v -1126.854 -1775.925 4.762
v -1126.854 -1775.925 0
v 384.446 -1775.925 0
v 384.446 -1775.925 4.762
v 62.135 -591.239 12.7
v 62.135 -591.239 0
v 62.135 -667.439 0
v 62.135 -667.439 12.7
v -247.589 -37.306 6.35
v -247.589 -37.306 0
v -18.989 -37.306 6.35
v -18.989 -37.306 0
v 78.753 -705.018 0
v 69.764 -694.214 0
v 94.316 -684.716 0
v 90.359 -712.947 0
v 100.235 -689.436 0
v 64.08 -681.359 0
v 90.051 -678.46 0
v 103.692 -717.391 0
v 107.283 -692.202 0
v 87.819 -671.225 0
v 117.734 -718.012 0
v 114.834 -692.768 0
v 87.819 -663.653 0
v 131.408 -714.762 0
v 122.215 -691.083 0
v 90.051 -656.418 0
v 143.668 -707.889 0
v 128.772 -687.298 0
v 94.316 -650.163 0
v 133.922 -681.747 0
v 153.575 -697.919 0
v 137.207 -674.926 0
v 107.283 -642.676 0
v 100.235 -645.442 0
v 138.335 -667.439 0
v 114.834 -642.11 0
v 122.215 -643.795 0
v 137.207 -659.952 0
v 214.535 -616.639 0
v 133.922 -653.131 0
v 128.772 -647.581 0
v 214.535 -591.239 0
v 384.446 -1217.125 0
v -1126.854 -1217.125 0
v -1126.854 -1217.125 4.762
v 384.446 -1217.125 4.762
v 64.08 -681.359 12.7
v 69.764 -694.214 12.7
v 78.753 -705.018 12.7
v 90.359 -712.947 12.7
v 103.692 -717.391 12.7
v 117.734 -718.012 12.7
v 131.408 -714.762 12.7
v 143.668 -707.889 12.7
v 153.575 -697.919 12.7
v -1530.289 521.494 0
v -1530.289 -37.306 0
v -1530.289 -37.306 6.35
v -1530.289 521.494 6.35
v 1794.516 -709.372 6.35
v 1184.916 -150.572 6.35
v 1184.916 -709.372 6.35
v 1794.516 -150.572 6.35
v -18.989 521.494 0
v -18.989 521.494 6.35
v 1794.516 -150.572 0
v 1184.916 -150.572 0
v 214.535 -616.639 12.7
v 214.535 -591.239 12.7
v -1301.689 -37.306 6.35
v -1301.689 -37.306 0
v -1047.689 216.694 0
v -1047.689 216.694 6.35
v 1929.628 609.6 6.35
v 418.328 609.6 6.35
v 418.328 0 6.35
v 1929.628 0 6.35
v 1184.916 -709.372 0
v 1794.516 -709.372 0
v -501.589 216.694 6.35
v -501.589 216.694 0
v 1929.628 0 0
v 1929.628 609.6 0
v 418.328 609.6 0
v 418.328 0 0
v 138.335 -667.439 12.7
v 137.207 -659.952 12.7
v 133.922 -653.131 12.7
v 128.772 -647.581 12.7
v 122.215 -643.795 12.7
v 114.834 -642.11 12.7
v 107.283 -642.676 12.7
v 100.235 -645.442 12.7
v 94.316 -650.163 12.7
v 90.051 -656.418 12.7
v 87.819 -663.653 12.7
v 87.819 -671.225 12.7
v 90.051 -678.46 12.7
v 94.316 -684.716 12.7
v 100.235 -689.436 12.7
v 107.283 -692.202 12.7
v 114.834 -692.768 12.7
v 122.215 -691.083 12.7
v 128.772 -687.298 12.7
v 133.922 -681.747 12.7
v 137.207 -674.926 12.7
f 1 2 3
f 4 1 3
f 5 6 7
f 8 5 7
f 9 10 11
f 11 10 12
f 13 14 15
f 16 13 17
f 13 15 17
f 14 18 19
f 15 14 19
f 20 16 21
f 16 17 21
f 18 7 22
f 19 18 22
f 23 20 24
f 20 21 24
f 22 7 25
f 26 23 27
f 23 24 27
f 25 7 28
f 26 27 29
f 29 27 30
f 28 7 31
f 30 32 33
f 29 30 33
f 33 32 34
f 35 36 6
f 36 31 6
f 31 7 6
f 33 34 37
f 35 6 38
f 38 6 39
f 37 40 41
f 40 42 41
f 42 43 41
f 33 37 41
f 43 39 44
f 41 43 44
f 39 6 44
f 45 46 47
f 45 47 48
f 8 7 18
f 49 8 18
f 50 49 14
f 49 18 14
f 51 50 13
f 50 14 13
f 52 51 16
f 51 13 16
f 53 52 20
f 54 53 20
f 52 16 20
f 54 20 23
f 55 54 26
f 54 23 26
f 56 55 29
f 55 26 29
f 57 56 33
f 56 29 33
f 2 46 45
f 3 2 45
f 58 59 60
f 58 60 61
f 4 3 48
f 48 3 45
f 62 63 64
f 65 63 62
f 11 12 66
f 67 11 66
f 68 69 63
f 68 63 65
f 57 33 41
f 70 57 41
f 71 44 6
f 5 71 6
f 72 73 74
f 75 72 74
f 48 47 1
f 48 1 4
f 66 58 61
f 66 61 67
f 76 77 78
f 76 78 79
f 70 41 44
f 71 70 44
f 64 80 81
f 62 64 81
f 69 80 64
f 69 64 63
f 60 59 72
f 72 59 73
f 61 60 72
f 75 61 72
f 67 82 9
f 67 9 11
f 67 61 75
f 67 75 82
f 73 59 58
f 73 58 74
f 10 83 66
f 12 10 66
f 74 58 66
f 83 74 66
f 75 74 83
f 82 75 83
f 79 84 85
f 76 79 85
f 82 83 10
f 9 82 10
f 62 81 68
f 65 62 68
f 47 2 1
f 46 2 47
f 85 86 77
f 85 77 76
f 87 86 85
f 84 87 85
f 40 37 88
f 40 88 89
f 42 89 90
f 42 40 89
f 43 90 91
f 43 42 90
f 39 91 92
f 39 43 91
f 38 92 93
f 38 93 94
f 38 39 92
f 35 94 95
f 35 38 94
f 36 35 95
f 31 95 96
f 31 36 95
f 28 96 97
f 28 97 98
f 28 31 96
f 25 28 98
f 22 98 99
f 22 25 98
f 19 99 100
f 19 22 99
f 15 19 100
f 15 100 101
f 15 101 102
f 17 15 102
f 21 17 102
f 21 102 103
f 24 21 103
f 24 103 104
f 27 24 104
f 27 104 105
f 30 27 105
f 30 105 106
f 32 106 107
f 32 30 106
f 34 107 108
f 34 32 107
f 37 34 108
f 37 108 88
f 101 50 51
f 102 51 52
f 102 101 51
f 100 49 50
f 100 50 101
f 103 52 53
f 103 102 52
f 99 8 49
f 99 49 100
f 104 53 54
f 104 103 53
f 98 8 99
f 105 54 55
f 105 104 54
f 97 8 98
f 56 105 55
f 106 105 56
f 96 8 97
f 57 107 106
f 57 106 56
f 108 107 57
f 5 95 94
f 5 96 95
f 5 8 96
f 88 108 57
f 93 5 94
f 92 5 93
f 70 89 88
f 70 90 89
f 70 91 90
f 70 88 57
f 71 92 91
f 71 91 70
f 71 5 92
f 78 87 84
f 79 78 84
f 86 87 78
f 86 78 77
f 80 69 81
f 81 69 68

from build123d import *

# Parameters (mm, degrees)
F0_W      = 1511.3
F0_H      = 558.8
F1_DEPTH  = 6.35
F2_W      = 1511.3
F2_H      = 609.6
F3_DEPTH  = 6.35
F5_DEPTH  = 6.351
F6_DEPTH  = 25.4
F7_W      = 609.6
F7_H      = 558.8
F8_DEPTH  = 6.35
F9_R      = 25.4
F10_DEPTH = 12.7
F11_W     = 1511.3
F11_H     = 558.8
F12_DEPTH = 4.7625


with BuildPart() as f1:
    # F0 (on Top) → F1 (new body)
    with BuildSketch(Plane.XY):
        with Locations((-774.6387154847, 242.0941420138)):
            Rectangle(F0_W, F0_H)
    extrude(amount=F1_DEPTH)

    # F4 (on face) → F5 (cut, through all)
    with BuildSketch(Plane(origin=(0, 0, 0), x_dir=(1, 0, 0), z_dir=(0, 0, -1))):
        Polygon((-1301.6887154847, 37.3058579862), (-1047.6887154847, -216.6941420138), (-501.5887154847, -216.6941420138), (-247.5887154847, 37.3058579862), align=None)
    extrude(amount=-F5_DEPTH, mode=Mode.SUBTRACT)

    # F4 (on face) → F6 (cut)
    with BuildSketch(Plane(origin=(0, 0, 0), x_dir=(1, 0, 0), z_dir=(0, 0, -1))):
        Polygon((-1301.6887154847, 37.3058579862), (-1047.6887154847, -216.6941420138), (-501.5887154847, -216.6941420138), (-247.5887154847, 37.3058579862), align=None)
    extrude(amount=F6_DEPTH, mode=Mode.SUBTRACT)


with BuildPart() as f3:
    # F2 (on Top) → F3 (new body)
    with BuildSketch(Plane.XY):
        with Locations((1173.9777785778, 304.8)):
            Rectangle(F2_W, F2_H)
    extrude(amount=F3_DEPTH)


with BuildPart() as f8:
    # F7 (on Top) → F8 (new body)
    with BuildSketch(Plane.XY):
        with Locations((1489.716138649, -429.9723416328)):
            Rectangle(F7_W, F7_H)
    extrude(amount=F8_DEPTH)


with BuildPart() as f10:
    # F9 (on Top) → F10 (new body)
    with BuildSketch(Plane.XY):
        with BuildLine():
            Line((214.5354460064, -616.6391396422), (214.5354460064, -591.2391396422))
            Line((214.5354460064, -591.2391396422), (62.1354460064, -591.2391396422))
            Line((62.1354460064, -591.2391396422), (62.1354460064, -667.4391396422))
            ThreePointArc((62.1354460064, -667.4391396422), (96.8710754928, -715.6322511832), (153.5754460064, -697.9191396422))
            Line((153.5754460064, -697.9191396422), (214.5354460064, -616.6391396422))
        make_face()
        with Locations((112.9354460064, -667.4391396422)):
            Circle(F9_R, mode=Mode.SUBTRACT)
    extrude(amount=F10_DEPTH)


with BuildPart() as f12:
    # F11 (on Top) → F12 (new body)
    with BuildSketch(Plane.XY):
        with Locations((-371.2038236618, -1496.5250402451)):
            Rectangle(F11_W, F11_H)
    extrude(amount=F12_DEPTH)


solid = Compound([f1.part, f3.part, f8.part, f10.part, f12.part])
